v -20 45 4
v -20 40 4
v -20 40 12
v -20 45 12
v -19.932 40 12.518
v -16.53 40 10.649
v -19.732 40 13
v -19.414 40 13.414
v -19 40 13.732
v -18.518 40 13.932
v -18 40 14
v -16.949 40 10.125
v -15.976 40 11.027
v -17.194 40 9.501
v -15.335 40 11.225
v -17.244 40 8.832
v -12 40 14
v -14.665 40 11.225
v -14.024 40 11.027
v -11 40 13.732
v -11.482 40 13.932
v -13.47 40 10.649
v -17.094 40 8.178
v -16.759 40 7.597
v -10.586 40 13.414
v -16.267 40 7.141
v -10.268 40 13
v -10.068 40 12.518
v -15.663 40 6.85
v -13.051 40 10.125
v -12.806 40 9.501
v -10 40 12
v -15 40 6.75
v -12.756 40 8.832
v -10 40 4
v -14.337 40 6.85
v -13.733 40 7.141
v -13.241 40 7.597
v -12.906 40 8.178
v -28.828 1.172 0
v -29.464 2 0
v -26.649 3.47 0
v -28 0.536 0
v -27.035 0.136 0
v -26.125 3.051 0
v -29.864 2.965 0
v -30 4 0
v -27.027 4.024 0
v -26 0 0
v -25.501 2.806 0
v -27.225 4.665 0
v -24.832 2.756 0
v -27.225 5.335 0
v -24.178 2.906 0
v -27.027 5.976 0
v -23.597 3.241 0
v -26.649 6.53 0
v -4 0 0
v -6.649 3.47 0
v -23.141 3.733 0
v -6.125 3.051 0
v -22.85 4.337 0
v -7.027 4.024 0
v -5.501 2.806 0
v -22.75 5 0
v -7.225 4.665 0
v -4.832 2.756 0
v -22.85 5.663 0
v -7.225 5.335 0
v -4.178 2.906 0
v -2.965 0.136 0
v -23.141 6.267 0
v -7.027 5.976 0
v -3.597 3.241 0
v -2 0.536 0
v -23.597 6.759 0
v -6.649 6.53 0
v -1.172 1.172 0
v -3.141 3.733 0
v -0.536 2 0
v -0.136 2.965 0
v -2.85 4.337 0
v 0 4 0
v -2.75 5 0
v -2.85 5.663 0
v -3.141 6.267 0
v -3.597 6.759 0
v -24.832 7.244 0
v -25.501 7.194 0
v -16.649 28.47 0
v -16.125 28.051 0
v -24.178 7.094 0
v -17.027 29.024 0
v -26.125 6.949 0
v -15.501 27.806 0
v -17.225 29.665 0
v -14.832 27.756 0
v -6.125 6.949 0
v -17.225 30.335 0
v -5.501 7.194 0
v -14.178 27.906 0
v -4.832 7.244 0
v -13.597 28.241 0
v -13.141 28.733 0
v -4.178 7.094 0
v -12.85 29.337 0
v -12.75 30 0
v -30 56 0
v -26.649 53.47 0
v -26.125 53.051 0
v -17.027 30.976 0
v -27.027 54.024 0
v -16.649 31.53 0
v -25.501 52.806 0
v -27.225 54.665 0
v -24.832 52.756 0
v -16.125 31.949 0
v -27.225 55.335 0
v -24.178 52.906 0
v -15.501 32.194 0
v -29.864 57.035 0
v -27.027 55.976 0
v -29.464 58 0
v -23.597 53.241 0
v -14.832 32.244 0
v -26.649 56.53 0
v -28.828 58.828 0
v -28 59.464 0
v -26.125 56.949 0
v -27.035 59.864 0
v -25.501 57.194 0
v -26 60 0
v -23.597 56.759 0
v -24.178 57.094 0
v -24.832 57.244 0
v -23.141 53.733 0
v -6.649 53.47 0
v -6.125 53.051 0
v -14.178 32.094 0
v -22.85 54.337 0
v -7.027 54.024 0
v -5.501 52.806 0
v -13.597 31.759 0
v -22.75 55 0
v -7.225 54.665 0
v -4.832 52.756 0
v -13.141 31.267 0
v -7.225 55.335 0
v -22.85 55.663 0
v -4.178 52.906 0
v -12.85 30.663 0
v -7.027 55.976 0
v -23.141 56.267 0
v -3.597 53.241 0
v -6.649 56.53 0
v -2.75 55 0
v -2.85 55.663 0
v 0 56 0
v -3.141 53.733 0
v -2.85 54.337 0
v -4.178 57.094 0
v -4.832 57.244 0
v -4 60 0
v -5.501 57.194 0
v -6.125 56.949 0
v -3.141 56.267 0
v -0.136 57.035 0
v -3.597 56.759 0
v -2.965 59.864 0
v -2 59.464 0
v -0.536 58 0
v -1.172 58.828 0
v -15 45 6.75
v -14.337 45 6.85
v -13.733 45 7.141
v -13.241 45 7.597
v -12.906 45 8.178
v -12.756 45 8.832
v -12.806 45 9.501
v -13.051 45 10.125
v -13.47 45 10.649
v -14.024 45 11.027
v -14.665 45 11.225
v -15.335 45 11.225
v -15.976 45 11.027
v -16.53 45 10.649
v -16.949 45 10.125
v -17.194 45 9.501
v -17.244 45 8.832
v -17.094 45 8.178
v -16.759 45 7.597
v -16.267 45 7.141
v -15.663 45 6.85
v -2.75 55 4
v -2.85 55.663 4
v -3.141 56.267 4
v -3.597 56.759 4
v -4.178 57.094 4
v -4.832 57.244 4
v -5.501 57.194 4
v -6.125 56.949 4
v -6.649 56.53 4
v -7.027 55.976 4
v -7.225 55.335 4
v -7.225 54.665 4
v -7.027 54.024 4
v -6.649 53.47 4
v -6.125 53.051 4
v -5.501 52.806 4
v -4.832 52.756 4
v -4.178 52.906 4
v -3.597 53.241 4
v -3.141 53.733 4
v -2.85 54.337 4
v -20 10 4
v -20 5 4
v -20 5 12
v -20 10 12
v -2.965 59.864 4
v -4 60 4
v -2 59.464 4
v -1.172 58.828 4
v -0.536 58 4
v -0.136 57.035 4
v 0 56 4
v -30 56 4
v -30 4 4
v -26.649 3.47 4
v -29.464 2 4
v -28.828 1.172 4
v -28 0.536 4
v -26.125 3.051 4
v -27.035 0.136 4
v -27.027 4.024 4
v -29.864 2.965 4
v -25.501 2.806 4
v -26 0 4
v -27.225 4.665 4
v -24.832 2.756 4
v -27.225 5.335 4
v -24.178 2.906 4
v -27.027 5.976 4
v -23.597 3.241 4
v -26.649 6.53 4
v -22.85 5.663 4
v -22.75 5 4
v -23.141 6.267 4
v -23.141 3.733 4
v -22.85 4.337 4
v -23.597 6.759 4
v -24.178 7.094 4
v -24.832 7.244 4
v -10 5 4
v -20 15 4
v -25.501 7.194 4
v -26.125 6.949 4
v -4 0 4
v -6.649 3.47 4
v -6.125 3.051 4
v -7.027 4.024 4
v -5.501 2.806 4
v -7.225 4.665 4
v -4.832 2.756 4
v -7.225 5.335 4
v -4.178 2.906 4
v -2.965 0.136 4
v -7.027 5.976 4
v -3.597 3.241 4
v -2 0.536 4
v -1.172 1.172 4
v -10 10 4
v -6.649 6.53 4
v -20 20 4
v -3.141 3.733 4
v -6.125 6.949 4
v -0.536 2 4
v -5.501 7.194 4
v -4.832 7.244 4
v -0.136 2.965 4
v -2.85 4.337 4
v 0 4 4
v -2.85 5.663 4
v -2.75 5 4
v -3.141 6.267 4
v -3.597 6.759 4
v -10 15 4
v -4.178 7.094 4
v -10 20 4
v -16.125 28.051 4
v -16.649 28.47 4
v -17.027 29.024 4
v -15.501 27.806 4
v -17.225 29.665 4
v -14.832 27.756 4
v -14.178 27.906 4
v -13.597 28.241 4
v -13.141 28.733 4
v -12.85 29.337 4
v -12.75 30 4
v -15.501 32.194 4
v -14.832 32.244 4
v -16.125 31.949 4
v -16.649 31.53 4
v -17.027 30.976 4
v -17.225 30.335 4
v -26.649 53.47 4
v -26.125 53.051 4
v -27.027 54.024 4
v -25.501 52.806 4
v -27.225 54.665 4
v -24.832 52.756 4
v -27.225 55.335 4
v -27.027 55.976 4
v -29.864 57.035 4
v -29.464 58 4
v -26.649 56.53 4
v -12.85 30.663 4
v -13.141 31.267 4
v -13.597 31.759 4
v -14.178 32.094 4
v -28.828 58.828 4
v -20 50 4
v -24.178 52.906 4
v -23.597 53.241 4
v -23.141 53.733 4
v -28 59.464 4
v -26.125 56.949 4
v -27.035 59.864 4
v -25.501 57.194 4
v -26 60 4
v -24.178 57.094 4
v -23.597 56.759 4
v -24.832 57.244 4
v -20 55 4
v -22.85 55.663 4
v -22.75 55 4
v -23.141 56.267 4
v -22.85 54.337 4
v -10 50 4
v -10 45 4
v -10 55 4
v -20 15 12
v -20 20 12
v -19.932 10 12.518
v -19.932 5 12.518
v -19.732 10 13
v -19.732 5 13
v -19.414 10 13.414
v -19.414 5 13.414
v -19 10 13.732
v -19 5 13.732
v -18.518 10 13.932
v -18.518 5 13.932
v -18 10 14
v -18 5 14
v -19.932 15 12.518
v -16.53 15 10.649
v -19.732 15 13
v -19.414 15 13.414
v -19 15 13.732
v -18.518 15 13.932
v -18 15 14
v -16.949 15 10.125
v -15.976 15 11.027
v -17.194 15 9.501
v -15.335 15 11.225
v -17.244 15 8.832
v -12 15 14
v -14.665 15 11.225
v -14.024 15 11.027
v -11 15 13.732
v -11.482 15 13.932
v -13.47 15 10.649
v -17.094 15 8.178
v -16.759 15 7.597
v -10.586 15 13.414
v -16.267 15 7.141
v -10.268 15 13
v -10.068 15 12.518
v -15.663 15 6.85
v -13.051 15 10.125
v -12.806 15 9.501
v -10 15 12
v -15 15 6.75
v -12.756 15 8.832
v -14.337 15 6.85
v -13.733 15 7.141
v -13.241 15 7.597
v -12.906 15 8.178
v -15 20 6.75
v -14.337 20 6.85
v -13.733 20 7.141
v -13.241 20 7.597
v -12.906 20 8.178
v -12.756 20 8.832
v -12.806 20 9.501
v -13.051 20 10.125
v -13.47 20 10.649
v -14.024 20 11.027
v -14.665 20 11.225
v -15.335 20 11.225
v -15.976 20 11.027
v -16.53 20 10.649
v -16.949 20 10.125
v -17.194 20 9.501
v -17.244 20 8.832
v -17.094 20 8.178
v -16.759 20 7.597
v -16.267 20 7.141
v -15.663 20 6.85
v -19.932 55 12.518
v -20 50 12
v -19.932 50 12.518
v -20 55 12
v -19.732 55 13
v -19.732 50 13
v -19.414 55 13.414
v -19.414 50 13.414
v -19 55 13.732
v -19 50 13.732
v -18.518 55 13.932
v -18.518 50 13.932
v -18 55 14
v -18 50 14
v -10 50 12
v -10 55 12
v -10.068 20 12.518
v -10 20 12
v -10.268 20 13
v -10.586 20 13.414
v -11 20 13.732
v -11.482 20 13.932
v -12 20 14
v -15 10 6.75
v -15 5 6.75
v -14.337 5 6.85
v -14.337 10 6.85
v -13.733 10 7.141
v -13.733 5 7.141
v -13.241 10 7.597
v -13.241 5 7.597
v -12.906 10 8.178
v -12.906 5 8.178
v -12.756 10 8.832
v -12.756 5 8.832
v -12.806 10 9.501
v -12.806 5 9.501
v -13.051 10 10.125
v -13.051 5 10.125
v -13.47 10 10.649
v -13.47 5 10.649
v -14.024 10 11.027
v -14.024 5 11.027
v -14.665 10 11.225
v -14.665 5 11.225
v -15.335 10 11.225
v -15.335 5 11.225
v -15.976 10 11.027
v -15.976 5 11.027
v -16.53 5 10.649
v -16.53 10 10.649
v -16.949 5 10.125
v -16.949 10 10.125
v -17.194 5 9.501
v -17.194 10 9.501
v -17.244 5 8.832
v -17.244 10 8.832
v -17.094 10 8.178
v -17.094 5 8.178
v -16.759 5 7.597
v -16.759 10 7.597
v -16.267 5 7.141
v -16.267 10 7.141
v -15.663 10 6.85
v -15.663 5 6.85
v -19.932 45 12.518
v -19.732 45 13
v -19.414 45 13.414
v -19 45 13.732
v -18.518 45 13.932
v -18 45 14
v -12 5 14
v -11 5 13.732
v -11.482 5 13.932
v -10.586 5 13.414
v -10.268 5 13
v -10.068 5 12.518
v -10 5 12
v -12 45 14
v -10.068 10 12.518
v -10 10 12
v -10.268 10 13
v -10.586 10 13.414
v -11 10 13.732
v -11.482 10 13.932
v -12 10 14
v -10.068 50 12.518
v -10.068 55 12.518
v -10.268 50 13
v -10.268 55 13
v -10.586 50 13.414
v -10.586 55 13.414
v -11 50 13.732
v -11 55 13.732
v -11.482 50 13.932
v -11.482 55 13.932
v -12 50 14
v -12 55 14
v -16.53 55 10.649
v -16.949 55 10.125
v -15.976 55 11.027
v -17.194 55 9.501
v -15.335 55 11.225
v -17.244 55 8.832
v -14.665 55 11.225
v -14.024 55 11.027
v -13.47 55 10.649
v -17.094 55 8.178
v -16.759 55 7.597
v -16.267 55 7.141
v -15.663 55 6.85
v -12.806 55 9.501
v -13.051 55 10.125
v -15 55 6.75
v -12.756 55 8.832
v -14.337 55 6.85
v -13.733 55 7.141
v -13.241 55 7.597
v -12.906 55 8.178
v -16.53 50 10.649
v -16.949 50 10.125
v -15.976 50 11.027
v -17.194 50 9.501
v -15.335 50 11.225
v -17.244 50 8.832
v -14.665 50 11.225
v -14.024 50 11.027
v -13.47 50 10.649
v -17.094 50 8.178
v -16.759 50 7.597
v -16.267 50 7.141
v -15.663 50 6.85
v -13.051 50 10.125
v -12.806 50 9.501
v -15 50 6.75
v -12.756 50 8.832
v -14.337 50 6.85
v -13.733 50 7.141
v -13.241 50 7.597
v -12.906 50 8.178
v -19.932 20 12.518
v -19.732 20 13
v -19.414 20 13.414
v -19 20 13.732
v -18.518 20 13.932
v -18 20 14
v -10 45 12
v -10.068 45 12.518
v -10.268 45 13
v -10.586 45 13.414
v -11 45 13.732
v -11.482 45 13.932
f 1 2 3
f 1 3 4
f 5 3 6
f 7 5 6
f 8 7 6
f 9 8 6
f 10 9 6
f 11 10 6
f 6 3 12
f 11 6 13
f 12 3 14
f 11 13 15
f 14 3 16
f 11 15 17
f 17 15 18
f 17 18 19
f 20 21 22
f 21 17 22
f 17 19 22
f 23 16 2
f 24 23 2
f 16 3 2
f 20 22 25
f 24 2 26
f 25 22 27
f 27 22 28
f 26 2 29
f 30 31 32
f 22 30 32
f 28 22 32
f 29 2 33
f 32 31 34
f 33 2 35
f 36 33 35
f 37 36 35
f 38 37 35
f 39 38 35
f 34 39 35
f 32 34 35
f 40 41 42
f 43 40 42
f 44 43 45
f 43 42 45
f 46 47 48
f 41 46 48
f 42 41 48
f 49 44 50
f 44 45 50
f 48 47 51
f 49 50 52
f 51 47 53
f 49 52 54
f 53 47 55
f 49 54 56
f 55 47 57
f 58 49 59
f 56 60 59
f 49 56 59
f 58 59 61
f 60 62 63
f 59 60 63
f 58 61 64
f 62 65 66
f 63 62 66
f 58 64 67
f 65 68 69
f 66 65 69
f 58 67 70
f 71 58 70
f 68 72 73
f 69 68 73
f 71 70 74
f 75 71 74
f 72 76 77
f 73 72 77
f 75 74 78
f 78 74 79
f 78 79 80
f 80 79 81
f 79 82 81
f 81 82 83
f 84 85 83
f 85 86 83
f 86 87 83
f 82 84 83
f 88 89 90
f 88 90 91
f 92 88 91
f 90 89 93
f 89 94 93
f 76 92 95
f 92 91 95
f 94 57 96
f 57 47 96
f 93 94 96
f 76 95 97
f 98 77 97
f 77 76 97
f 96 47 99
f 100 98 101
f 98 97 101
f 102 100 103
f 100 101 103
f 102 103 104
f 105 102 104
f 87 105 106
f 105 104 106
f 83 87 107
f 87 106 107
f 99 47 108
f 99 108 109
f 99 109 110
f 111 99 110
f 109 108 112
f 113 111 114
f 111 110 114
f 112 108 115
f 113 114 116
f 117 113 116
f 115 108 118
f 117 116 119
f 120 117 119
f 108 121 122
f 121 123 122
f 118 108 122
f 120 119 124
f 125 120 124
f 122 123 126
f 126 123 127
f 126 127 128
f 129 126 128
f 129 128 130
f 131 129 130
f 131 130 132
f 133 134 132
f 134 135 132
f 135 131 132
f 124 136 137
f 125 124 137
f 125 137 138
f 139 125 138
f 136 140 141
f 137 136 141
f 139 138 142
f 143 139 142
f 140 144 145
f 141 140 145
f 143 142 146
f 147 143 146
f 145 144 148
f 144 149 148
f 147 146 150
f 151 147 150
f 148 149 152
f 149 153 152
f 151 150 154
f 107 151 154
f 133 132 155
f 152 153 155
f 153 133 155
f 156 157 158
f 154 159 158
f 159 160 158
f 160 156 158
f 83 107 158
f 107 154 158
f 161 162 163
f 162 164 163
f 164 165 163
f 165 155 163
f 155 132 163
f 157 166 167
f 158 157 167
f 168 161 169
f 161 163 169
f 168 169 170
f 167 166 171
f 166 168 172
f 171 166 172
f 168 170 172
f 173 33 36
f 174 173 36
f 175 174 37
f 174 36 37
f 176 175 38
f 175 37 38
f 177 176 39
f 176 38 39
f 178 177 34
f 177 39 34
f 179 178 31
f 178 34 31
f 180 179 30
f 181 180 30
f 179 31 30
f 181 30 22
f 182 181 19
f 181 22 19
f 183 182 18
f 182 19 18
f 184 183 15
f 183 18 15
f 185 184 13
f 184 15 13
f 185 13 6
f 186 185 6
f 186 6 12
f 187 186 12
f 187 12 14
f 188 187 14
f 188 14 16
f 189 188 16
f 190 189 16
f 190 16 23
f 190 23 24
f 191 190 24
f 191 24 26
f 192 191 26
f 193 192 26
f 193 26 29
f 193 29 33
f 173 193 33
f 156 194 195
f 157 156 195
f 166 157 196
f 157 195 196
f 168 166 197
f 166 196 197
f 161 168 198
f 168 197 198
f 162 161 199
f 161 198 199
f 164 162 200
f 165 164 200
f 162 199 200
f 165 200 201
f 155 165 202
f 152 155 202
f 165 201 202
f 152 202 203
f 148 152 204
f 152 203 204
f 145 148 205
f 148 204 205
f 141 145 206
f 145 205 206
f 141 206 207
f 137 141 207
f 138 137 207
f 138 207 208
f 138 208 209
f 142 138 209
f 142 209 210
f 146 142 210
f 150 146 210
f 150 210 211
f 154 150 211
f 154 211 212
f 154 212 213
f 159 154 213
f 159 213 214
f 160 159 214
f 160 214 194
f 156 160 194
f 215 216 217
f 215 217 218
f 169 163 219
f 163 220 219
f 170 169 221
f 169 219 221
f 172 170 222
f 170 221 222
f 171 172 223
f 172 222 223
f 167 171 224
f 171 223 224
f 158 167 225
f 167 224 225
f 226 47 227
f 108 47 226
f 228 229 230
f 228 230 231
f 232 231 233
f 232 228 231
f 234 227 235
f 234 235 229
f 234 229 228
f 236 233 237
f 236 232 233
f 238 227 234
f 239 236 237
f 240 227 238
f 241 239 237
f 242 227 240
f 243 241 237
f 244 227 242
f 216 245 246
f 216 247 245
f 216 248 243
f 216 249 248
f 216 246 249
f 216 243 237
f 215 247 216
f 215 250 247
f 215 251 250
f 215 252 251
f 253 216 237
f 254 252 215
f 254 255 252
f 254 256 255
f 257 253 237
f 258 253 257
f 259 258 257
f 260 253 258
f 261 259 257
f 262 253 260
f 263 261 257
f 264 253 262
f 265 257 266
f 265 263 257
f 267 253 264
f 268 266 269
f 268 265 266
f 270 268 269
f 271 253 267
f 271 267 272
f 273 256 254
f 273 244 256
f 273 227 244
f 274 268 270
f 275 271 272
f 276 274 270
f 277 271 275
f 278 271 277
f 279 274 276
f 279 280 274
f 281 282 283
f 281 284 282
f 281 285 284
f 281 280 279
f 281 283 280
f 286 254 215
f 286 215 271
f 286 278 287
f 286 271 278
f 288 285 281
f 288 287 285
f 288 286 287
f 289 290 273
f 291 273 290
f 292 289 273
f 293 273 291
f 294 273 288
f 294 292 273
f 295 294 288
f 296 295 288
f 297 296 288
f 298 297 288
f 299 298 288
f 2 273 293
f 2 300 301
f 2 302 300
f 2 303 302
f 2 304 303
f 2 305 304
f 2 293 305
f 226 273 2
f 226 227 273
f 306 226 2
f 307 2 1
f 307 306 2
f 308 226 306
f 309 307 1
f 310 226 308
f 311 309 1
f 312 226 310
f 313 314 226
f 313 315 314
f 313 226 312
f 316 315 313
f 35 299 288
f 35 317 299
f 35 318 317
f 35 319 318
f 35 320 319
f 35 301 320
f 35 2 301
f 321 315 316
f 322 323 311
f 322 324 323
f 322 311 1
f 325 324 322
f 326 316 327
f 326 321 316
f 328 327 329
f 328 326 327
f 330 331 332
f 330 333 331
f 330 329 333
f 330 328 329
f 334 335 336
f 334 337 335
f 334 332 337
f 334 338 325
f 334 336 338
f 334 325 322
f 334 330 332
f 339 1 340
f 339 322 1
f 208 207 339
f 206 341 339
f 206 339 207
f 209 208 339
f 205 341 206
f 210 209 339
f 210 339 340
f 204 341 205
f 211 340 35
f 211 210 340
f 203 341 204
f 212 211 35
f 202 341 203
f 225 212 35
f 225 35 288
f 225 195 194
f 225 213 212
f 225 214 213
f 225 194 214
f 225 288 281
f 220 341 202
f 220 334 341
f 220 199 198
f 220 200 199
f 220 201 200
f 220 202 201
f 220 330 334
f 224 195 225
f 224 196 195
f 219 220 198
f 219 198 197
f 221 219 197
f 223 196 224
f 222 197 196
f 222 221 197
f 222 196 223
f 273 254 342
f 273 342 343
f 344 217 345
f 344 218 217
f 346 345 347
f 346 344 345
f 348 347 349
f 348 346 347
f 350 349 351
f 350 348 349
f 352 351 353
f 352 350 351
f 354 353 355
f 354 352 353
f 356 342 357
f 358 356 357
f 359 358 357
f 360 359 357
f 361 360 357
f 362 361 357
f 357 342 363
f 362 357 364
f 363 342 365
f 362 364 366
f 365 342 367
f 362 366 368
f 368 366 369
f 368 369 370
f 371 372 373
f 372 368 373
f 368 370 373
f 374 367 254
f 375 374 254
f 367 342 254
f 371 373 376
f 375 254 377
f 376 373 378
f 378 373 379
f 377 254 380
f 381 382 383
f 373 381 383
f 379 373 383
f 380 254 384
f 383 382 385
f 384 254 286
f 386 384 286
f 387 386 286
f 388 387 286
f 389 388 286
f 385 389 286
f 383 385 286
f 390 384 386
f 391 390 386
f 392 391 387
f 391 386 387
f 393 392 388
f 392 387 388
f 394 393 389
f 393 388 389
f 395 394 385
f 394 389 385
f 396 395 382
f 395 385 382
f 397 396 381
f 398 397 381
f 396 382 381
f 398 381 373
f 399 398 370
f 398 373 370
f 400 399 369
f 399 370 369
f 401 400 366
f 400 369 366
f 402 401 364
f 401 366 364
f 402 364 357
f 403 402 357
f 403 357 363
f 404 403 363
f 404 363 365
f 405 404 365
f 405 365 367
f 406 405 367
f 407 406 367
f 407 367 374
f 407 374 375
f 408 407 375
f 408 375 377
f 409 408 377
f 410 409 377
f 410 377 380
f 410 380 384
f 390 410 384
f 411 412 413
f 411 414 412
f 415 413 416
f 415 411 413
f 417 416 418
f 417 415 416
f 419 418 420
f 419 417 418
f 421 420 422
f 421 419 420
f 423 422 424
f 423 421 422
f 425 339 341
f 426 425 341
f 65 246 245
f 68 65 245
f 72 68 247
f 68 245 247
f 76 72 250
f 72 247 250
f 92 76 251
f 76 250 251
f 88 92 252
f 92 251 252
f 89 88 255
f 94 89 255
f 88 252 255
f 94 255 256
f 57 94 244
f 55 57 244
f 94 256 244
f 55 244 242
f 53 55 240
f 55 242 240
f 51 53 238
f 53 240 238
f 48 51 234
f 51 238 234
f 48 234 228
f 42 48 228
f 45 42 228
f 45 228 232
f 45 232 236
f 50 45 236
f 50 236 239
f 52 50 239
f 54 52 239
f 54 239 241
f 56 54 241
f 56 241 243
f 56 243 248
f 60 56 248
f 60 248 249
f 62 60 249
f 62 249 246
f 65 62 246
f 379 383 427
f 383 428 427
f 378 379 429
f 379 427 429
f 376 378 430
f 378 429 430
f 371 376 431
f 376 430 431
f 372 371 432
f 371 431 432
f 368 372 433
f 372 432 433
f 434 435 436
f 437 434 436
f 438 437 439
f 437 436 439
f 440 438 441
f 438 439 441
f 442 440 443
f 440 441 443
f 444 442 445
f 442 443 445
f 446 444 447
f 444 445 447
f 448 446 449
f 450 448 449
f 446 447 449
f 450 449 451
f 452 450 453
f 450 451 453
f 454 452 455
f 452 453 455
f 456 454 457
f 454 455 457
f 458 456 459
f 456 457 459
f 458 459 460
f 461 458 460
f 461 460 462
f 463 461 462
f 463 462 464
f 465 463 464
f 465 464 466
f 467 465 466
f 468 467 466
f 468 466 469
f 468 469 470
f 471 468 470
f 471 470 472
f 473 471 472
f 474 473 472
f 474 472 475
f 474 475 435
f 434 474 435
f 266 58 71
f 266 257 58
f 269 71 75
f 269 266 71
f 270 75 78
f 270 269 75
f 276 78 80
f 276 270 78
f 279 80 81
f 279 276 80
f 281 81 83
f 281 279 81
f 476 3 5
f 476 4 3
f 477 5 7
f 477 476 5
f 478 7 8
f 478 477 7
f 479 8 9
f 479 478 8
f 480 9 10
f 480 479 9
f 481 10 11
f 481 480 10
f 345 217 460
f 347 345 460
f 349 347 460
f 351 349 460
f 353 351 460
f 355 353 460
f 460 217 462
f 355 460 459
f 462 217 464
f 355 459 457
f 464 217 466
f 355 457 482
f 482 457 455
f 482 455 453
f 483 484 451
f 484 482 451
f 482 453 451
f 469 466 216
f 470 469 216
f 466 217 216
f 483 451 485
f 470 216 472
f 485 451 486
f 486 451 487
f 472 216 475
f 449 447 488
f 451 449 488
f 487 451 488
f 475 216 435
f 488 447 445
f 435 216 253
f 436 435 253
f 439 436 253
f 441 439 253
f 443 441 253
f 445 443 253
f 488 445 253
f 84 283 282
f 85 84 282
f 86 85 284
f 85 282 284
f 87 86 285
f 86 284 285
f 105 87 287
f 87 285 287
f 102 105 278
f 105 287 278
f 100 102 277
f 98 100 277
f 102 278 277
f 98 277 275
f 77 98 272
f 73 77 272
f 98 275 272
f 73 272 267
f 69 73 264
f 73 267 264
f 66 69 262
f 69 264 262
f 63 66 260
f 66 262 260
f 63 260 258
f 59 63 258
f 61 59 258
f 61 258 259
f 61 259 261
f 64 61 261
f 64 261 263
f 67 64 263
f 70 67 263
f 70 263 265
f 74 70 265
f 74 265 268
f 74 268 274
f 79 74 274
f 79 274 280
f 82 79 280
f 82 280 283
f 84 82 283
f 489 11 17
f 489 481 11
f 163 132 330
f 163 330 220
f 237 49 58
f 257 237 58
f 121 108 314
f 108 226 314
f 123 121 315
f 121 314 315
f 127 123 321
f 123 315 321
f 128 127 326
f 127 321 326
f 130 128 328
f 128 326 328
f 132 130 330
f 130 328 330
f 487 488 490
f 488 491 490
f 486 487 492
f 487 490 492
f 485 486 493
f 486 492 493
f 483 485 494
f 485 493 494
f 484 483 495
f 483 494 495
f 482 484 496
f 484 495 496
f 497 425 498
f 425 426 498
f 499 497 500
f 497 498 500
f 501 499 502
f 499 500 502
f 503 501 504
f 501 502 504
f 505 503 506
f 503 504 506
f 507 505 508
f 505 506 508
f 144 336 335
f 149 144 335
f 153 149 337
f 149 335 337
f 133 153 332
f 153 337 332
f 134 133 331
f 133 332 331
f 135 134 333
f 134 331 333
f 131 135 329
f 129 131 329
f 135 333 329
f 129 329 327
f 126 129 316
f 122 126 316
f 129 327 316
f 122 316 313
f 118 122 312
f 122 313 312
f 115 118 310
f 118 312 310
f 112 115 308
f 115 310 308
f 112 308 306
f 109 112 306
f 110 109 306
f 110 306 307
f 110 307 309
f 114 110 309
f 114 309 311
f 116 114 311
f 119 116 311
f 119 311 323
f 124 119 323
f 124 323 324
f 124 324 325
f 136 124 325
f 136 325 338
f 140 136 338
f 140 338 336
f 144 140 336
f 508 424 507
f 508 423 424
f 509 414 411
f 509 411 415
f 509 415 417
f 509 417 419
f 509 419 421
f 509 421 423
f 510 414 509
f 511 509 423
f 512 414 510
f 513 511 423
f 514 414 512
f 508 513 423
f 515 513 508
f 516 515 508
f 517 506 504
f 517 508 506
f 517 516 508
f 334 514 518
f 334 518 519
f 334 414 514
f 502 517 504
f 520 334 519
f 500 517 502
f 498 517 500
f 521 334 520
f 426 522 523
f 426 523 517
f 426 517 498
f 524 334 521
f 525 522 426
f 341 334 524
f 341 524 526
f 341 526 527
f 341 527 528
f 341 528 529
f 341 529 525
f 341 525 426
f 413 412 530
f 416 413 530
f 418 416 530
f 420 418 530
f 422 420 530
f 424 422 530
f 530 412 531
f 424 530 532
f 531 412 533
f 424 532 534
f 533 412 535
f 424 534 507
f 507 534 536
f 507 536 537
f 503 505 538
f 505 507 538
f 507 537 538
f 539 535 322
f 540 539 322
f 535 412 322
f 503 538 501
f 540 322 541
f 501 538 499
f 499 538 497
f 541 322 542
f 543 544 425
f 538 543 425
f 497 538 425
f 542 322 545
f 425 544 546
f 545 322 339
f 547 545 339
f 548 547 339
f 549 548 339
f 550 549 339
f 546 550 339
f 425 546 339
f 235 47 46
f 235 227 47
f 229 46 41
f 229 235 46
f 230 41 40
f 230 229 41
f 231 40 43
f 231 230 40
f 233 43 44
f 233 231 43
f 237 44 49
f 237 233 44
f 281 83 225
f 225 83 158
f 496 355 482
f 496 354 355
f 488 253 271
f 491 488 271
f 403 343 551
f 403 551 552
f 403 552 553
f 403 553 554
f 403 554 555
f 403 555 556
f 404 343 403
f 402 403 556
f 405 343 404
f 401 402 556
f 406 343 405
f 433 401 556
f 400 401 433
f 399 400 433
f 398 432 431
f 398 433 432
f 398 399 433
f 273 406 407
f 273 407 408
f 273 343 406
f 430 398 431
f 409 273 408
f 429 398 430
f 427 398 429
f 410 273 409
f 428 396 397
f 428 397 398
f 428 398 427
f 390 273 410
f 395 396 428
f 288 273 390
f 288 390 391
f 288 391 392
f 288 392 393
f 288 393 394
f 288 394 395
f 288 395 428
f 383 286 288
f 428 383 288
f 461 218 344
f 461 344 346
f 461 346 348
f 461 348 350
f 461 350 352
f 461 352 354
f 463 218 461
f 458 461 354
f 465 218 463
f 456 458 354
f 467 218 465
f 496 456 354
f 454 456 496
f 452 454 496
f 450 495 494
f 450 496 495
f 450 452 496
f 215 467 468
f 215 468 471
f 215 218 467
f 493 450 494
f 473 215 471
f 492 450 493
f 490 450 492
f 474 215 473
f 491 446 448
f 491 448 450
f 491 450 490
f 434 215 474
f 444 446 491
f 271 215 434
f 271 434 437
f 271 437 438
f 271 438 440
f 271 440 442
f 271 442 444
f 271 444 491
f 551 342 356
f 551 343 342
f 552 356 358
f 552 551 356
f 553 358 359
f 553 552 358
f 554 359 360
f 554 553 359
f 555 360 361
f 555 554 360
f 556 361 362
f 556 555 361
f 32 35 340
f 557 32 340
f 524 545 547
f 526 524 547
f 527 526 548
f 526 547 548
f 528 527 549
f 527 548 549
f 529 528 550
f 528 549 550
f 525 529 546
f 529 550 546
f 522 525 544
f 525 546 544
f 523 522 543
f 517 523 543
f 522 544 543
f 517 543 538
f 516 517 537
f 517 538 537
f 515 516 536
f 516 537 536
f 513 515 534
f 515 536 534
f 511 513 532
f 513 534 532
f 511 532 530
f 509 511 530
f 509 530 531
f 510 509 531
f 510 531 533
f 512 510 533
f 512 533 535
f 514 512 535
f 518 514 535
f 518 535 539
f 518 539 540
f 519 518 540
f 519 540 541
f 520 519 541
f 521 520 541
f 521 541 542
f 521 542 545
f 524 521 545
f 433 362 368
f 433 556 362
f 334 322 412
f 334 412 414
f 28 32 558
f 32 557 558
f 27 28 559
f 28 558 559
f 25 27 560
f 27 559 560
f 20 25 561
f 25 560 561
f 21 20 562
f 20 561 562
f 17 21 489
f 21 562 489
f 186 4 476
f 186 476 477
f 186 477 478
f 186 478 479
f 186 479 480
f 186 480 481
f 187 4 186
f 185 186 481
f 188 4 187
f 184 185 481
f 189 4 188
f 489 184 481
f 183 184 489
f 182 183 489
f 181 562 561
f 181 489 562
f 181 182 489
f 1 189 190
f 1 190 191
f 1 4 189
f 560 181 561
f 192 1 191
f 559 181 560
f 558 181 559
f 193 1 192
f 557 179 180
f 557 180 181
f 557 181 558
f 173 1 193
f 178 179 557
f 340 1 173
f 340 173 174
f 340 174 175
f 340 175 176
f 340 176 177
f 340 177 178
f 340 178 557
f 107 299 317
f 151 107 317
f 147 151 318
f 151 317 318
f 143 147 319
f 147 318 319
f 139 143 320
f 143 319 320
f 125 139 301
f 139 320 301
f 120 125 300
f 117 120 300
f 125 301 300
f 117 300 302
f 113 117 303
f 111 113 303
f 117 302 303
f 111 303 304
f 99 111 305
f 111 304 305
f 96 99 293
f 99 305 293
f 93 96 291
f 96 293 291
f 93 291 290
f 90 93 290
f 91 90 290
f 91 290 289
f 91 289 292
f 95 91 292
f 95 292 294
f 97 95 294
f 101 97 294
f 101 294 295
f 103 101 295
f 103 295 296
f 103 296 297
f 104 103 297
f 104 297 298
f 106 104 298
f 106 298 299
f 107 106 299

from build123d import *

# Parameters (mm, degrees)
ESQUISSE1_W             = 30
ESQUISSE1_H             = 60
BOSS_EXTRU_1_DEPTH      = 4
ESQUISSE2_W             = 10
ESQUISSE2_H             = 5
BOSS_EXTRU_2_DEPTH      = 10
ESQUISSE3_R             = 2.25
ENL_V_MAT_EXTRU_1_DEPTH = 56
CONG_1_R                = 2
CONG_2_R                = 4
ESQUISSE4_R             = 2.25
ENL_V_MAT_EXTRU_2_DEPTH = 5


with BuildPart() as part:
    # Esquisse1 → Boss.-Extru.1 (new body)
    with BuildSketch(Plane.XY):
        with Locations((-15, 30)):
            Rectangle(ESQUISSE1_W, ESQUISSE1_H)
    extrude(amount=BOSS_EXTRU_1_DEPTH)

    # Esquisse2 → Boss.-Extru.2 (add)
    with BuildSketch(Plane.XY.offset(4)):
        with Locations((-15, 52.5)):
            Rectangle(ESQUISSE2_W, ESQUISSE2_H)
        with Locations((-15, 42.5)):
            Rectangle(ESQUISSE2_W, ESQUISSE2_H)
        with Locations((-15, 17.5)):
            Rectangle(ESQUISSE2_W, ESQUISSE2_H)
        with Locations((-15, 7.5)):
            Rectangle(ESQUISSE2_W, ESQUISSE2_H)
    extrude(amount=BOSS_EXTRU_2_DEPTH)

    # Esquisse3 → Enlèv. mat.-Extru.1 (cut, through all)
    with BuildSketch(Plane.XZ.offset(-5)):
        with Locations(Location((-15, 9, 0), (0, 0, 270))):  # turned: the seam where the file's is
            Circle(ESQUISSE3_R)
    extrude(amount=-ENL_V_MAT_EXTRU_1_DEPTH, mode=Mode.SUBTRACT)

    # Congé1
    cong_1_edges = [part.edges().sort_by_distance(p)[0] for p in [
        (-20, 52.5, 14),
        (-10, 52.5, 14),
        (-20, 42.5, 14),
        (-10, 42.5, 14),
        (-20, 17.5, 14),
        (-10, 17.5, 14),
        (-20, 7.5, 14),
        (-10, 7.5, 14),
    ]]
    fillet(cong_1_edges, radius=CONG_1_R)

    # Congé2
    cong_2_edges = [part.edges().sort_by_distance(p)[0] for p in [
        (-30, 60, 2),
        (0, 60, 2),
        (0, 0, 2),
        (-30, 0, 2),
    ]]
    fillet(cong_2_edges, radius=CONG_2_R)

    # Esquisse4 → Enlèv. mat.-Extru.2 (cut, through all)
    with BuildSketch(Plane.XY.offset(4)):
        with Locations((-5, 55)):
            Circle(ESQUISSE4_R)
        with Locations((-25, 55)):
            Circle(ESQUISSE4_R)
        with Locations((-5, 5)):
            Circle(ESQUISSE4_R)
        with Locations((-25, 5)):
            Circle(ESQUISSE4_R)
        with Locations((-15, 30)):
            Circle(ESQUISSE4_R)
    extrude(amount=-ENL_V_MAT_EXTRU_2_DEPTH, mode=Mode.SUBTRACT)


solid = part.part
